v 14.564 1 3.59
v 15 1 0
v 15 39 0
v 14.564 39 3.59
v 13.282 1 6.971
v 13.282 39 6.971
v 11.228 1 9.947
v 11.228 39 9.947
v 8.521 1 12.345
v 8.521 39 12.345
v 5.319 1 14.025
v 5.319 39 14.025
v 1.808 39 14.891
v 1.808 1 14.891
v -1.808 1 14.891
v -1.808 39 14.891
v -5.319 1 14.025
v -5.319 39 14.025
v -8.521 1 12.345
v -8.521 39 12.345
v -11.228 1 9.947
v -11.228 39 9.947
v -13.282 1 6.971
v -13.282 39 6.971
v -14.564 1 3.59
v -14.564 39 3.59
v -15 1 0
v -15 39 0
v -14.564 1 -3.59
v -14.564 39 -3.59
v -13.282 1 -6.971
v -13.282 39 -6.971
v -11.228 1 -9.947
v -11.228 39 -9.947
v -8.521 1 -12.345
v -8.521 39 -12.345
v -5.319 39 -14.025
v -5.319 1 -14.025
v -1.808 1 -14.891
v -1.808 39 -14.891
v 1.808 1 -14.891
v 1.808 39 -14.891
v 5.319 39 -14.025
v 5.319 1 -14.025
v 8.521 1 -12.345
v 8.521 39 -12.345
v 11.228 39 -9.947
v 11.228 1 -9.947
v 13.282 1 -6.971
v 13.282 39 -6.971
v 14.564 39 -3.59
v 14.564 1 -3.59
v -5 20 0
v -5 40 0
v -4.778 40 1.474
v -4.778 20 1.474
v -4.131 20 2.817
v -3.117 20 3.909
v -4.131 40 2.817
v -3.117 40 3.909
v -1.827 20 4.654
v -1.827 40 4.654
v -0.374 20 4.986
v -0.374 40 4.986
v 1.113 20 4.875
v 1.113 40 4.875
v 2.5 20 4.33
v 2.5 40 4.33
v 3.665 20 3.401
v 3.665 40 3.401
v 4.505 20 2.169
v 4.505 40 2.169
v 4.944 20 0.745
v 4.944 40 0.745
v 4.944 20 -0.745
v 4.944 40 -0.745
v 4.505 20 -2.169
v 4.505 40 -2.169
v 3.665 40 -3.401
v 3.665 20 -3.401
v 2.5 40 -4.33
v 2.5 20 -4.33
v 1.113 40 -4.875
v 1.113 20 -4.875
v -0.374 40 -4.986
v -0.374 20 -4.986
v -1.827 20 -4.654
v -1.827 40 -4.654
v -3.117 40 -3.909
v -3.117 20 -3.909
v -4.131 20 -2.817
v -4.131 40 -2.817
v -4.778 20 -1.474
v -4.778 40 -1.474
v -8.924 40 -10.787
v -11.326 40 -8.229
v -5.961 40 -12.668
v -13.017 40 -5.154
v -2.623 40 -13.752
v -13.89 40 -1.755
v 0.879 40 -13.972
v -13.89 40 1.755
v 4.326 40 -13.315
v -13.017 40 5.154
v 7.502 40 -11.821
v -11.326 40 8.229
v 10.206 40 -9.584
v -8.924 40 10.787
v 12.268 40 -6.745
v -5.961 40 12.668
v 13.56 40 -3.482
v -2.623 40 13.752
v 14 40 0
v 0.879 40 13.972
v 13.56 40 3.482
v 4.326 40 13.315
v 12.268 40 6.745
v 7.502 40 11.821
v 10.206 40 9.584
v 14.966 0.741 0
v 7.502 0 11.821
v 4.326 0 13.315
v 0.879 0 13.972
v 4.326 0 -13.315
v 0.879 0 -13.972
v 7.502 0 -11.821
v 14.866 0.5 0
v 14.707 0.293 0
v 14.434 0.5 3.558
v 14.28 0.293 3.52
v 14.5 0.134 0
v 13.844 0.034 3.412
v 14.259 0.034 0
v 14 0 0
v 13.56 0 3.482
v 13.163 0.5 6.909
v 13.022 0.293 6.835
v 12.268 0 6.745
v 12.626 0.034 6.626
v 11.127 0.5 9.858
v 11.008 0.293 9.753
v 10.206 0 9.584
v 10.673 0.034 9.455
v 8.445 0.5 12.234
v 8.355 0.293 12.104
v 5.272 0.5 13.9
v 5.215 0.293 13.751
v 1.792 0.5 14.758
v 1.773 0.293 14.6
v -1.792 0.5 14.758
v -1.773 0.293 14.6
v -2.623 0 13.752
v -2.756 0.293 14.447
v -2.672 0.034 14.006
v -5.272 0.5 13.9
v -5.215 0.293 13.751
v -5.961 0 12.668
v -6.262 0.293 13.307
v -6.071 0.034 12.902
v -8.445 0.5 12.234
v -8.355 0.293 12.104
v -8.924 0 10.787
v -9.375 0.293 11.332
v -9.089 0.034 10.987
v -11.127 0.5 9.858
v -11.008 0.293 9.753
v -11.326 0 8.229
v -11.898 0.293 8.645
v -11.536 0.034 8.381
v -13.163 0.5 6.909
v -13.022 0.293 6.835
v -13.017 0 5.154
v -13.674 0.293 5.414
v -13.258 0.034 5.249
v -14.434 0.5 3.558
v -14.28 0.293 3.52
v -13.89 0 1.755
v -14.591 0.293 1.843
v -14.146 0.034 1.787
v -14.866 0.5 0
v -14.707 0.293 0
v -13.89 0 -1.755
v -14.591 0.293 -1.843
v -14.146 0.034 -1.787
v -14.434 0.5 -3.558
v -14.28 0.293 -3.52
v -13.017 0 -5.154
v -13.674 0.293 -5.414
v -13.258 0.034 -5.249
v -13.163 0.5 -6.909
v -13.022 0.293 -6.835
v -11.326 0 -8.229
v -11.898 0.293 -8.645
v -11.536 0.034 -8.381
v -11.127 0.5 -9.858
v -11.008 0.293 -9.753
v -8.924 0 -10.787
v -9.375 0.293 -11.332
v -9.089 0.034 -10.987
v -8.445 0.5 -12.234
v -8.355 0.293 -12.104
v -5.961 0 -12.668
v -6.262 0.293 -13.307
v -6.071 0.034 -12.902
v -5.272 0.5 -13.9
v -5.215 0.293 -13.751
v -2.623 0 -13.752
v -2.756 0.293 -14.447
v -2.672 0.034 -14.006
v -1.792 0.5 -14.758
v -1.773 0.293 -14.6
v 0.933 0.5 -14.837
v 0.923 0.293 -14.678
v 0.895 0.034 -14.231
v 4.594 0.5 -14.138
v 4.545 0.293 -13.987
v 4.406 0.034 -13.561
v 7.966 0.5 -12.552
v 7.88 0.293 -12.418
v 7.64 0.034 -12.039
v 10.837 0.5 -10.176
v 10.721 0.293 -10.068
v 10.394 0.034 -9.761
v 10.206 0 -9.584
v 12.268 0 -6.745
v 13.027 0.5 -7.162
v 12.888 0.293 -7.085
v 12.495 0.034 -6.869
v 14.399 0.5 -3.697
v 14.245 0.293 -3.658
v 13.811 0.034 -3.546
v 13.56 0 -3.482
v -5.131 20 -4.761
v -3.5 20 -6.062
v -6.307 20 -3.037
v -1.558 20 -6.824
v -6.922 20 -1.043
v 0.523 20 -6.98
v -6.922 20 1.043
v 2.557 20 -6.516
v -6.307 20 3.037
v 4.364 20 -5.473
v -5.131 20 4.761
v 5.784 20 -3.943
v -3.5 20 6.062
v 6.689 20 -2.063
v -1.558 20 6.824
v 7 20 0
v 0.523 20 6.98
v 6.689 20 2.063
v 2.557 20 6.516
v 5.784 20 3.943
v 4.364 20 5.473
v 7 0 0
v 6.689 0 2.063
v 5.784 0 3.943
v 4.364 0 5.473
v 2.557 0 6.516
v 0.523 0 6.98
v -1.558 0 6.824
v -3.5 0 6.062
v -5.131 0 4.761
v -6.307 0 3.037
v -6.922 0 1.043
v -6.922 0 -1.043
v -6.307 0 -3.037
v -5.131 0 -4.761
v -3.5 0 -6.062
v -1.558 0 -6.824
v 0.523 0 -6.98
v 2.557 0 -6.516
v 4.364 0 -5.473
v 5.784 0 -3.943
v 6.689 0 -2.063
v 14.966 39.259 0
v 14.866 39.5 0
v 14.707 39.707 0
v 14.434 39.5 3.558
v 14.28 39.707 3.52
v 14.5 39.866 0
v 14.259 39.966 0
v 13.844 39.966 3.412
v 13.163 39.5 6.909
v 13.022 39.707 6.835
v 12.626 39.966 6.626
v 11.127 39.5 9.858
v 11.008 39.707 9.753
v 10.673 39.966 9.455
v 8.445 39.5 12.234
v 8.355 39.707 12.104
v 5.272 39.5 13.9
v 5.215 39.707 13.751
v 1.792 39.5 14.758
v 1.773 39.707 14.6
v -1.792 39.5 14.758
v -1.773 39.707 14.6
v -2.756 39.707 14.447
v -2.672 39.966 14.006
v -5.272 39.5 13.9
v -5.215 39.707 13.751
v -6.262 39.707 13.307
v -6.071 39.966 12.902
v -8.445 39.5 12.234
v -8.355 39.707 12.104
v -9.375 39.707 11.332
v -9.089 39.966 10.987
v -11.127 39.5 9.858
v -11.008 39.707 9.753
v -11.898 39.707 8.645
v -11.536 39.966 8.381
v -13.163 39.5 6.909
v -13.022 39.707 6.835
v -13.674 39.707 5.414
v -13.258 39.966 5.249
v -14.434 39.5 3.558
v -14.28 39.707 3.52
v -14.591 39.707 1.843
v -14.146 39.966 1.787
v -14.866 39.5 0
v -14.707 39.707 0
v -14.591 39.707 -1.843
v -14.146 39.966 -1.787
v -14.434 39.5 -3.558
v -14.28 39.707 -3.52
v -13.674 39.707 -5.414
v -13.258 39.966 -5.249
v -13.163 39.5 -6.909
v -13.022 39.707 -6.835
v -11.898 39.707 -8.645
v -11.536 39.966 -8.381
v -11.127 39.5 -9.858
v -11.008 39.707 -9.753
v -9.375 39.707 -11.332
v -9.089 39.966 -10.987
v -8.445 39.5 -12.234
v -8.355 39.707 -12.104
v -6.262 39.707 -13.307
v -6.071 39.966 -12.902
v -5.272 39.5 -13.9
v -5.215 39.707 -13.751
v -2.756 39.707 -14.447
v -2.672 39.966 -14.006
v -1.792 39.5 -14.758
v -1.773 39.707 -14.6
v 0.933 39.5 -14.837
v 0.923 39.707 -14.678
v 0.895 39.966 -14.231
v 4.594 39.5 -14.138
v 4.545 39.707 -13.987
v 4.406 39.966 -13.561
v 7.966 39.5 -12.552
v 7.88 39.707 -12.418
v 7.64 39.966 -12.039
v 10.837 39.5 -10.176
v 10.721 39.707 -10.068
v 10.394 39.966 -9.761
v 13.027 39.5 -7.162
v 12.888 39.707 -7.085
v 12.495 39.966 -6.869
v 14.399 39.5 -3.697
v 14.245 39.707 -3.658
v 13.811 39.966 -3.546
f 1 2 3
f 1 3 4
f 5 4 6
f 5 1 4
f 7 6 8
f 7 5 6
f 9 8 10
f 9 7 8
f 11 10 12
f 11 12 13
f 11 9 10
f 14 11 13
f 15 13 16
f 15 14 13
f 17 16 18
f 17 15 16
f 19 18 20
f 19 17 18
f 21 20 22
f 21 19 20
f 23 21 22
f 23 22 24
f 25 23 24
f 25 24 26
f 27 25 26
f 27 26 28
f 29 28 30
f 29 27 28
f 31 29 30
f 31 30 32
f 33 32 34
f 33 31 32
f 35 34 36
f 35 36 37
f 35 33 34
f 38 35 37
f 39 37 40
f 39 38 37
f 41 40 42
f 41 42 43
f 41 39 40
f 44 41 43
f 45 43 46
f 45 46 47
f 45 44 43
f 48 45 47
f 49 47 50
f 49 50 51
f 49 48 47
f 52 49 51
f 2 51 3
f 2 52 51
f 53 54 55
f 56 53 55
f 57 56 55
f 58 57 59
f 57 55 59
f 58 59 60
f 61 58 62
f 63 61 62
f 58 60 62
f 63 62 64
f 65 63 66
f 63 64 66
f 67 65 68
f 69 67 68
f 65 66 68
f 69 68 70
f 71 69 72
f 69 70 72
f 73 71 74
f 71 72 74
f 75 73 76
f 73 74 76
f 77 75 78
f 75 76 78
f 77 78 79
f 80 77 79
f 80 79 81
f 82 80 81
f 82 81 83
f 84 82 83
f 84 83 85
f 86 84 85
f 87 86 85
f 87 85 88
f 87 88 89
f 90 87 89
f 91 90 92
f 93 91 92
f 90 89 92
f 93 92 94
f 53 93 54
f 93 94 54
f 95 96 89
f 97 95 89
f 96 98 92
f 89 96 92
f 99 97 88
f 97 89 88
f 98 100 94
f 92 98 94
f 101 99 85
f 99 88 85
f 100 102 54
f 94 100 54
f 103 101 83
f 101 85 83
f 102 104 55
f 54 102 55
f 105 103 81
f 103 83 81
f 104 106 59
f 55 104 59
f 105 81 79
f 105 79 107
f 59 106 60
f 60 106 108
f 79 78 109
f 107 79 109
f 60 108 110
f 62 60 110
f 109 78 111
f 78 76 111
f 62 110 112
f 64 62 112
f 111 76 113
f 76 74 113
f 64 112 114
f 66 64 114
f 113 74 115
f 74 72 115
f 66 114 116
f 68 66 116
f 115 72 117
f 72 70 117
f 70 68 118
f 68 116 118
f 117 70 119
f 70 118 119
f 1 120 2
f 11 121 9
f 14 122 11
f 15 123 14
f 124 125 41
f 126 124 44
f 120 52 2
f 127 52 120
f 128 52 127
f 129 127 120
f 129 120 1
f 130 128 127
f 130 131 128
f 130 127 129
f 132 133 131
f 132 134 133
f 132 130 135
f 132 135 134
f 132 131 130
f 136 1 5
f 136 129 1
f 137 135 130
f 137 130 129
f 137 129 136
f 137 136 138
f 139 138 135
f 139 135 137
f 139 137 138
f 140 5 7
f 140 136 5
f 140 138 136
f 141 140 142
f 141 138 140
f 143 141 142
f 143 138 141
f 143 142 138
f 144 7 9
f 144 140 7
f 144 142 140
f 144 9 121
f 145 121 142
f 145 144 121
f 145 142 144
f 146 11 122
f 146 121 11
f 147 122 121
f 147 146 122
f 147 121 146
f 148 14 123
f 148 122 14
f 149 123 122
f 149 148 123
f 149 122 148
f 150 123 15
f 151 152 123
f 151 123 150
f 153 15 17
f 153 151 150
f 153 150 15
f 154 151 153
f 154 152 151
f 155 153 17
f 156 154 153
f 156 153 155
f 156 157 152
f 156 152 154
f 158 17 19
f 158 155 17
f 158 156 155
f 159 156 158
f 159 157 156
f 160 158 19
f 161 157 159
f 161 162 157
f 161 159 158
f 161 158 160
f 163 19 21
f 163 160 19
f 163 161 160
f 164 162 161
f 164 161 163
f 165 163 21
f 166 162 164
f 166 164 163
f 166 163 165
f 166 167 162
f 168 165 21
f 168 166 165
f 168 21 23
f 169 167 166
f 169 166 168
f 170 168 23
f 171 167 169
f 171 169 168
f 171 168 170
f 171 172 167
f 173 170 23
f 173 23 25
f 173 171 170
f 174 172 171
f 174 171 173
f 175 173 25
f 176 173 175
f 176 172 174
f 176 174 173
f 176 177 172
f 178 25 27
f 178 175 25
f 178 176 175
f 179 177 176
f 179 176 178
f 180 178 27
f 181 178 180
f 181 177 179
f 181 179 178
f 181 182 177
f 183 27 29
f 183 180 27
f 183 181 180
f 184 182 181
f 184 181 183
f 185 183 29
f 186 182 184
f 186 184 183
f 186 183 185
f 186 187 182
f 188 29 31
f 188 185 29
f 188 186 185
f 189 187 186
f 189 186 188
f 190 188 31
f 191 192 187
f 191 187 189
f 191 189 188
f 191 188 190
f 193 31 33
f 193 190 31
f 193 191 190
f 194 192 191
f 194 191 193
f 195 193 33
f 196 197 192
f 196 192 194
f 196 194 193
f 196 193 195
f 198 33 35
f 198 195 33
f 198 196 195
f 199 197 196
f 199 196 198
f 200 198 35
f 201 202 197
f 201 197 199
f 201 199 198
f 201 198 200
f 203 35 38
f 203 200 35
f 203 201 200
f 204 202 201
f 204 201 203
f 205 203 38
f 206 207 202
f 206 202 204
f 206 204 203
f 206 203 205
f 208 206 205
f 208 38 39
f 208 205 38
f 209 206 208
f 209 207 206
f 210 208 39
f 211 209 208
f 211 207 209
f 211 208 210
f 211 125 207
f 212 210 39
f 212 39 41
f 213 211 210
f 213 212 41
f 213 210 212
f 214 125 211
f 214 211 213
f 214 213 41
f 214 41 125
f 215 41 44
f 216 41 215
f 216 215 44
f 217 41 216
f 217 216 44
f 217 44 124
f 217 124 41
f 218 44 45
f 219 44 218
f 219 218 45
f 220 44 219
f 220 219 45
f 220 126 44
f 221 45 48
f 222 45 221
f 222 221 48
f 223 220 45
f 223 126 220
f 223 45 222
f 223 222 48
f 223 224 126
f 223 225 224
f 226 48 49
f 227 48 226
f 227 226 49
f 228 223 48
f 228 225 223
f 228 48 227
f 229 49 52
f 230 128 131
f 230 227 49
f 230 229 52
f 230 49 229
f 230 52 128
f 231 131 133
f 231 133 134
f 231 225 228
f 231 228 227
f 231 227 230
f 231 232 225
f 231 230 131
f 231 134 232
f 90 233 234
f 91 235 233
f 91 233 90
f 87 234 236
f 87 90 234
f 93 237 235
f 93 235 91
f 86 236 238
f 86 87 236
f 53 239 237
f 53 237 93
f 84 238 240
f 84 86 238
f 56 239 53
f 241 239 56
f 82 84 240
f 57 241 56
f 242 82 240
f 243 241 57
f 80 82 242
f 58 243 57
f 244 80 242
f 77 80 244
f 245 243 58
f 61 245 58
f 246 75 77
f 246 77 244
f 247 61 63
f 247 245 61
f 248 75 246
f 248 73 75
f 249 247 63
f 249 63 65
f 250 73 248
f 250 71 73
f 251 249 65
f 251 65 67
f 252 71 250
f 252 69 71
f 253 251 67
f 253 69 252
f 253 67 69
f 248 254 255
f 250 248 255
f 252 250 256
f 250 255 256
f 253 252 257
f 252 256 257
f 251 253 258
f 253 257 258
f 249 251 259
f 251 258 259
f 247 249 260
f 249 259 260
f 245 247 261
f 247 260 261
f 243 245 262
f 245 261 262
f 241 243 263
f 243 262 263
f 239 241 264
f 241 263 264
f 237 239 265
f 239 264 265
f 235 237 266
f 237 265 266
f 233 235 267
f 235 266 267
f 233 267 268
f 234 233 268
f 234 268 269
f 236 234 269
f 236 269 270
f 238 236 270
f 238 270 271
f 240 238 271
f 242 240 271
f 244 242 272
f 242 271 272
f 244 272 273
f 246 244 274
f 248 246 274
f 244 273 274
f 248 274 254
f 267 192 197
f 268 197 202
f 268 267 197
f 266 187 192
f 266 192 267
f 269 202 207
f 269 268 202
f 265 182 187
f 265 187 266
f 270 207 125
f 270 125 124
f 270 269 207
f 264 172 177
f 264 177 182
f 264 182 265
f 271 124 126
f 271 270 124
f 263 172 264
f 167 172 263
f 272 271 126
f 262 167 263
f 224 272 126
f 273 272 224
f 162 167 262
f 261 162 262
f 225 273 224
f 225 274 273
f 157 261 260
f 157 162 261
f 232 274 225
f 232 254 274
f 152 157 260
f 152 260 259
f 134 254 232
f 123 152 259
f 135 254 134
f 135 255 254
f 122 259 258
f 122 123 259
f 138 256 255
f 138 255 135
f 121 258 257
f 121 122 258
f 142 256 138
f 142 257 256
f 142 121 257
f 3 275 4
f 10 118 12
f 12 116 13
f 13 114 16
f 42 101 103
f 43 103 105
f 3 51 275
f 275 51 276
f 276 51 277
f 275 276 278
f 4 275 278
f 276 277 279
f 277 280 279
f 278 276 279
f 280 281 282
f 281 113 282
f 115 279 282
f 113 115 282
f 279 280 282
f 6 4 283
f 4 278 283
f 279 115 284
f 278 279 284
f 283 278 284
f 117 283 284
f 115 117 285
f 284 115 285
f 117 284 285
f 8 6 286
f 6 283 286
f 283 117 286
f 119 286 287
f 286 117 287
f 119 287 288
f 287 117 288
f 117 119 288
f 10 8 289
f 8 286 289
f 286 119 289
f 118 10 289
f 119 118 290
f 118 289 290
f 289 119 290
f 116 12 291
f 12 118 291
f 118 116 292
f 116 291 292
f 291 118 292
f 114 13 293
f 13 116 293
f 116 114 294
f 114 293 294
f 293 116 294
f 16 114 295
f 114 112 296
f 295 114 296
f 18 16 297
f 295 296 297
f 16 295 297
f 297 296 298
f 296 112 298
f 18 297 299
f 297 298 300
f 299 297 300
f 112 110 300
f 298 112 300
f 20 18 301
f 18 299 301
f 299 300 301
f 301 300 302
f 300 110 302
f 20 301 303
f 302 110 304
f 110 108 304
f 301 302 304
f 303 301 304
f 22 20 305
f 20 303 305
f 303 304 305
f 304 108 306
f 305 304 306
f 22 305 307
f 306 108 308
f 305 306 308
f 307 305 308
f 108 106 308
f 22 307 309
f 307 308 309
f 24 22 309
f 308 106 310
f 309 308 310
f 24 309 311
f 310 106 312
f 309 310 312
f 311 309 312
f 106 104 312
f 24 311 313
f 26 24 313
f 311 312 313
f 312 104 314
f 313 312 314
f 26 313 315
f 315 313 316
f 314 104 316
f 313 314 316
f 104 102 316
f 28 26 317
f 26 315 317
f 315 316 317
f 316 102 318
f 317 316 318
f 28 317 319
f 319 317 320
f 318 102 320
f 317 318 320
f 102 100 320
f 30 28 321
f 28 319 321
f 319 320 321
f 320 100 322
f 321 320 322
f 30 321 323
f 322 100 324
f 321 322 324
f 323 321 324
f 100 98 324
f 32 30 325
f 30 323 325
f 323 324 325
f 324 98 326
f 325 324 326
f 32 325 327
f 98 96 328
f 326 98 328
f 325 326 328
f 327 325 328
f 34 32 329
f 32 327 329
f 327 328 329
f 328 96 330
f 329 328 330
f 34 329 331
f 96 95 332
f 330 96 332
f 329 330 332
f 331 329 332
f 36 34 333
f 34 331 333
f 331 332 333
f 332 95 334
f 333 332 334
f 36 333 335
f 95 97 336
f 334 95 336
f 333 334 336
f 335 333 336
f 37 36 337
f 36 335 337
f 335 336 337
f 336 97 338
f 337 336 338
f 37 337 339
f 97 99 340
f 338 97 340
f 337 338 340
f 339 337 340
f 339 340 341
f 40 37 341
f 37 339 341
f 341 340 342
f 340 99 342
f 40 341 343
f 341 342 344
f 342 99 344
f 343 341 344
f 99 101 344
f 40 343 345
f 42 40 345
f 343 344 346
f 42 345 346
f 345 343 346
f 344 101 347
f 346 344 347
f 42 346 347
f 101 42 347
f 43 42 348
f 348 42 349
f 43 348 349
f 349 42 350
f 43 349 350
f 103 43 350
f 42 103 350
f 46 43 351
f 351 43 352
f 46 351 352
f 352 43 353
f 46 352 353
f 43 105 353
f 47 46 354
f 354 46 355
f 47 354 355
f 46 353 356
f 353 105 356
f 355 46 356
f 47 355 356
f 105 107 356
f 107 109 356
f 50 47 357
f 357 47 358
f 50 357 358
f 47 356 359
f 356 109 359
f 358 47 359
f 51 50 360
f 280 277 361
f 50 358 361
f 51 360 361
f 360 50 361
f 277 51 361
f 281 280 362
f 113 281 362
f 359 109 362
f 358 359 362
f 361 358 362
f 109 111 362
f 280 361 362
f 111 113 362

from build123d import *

# Parameters (mm, degrees)
F6_R     = 15
F0_DEPTH = 40
F1_R     = 1
F2_R     = 7
F3_DEPTH = 20
F4_R     = 5
F5_DEPTH = 20


with BuildPart() as f0:
    # F6 (on Front) → F0 (new body)
    with BuildSketch(Plane.XZ):
        Circle(F6_R)
    extrude(amount=-F0_DEPTH)

    # F1
    f1_edges = [f0.edges().sort_by_distance(p)[0] for p in [
        (-15, 0, 0),
        (-15, 40, 0),
    ]]
    fillet(f1_edges, radius=F1_R)

    # F2 (on face) → F3 (cut)
    with BuildSketch(Plane.XZ):
        Circle(F2_R)
    extrude(amount=-F3_DEPTH, mode=Mode.SUBTRACT)

    # F4 (on face) → F5 (cut)
    with BuildSketch(Plane(origin=(0, 40, 0), x_dir=(-1, 0, 0), z_dir=(0, 1, 0))):
        Circle(F4_R)
    extrude(amount=-F5_DEPTH, mode=Mode.SUBTRACT)


solid = f0.part
